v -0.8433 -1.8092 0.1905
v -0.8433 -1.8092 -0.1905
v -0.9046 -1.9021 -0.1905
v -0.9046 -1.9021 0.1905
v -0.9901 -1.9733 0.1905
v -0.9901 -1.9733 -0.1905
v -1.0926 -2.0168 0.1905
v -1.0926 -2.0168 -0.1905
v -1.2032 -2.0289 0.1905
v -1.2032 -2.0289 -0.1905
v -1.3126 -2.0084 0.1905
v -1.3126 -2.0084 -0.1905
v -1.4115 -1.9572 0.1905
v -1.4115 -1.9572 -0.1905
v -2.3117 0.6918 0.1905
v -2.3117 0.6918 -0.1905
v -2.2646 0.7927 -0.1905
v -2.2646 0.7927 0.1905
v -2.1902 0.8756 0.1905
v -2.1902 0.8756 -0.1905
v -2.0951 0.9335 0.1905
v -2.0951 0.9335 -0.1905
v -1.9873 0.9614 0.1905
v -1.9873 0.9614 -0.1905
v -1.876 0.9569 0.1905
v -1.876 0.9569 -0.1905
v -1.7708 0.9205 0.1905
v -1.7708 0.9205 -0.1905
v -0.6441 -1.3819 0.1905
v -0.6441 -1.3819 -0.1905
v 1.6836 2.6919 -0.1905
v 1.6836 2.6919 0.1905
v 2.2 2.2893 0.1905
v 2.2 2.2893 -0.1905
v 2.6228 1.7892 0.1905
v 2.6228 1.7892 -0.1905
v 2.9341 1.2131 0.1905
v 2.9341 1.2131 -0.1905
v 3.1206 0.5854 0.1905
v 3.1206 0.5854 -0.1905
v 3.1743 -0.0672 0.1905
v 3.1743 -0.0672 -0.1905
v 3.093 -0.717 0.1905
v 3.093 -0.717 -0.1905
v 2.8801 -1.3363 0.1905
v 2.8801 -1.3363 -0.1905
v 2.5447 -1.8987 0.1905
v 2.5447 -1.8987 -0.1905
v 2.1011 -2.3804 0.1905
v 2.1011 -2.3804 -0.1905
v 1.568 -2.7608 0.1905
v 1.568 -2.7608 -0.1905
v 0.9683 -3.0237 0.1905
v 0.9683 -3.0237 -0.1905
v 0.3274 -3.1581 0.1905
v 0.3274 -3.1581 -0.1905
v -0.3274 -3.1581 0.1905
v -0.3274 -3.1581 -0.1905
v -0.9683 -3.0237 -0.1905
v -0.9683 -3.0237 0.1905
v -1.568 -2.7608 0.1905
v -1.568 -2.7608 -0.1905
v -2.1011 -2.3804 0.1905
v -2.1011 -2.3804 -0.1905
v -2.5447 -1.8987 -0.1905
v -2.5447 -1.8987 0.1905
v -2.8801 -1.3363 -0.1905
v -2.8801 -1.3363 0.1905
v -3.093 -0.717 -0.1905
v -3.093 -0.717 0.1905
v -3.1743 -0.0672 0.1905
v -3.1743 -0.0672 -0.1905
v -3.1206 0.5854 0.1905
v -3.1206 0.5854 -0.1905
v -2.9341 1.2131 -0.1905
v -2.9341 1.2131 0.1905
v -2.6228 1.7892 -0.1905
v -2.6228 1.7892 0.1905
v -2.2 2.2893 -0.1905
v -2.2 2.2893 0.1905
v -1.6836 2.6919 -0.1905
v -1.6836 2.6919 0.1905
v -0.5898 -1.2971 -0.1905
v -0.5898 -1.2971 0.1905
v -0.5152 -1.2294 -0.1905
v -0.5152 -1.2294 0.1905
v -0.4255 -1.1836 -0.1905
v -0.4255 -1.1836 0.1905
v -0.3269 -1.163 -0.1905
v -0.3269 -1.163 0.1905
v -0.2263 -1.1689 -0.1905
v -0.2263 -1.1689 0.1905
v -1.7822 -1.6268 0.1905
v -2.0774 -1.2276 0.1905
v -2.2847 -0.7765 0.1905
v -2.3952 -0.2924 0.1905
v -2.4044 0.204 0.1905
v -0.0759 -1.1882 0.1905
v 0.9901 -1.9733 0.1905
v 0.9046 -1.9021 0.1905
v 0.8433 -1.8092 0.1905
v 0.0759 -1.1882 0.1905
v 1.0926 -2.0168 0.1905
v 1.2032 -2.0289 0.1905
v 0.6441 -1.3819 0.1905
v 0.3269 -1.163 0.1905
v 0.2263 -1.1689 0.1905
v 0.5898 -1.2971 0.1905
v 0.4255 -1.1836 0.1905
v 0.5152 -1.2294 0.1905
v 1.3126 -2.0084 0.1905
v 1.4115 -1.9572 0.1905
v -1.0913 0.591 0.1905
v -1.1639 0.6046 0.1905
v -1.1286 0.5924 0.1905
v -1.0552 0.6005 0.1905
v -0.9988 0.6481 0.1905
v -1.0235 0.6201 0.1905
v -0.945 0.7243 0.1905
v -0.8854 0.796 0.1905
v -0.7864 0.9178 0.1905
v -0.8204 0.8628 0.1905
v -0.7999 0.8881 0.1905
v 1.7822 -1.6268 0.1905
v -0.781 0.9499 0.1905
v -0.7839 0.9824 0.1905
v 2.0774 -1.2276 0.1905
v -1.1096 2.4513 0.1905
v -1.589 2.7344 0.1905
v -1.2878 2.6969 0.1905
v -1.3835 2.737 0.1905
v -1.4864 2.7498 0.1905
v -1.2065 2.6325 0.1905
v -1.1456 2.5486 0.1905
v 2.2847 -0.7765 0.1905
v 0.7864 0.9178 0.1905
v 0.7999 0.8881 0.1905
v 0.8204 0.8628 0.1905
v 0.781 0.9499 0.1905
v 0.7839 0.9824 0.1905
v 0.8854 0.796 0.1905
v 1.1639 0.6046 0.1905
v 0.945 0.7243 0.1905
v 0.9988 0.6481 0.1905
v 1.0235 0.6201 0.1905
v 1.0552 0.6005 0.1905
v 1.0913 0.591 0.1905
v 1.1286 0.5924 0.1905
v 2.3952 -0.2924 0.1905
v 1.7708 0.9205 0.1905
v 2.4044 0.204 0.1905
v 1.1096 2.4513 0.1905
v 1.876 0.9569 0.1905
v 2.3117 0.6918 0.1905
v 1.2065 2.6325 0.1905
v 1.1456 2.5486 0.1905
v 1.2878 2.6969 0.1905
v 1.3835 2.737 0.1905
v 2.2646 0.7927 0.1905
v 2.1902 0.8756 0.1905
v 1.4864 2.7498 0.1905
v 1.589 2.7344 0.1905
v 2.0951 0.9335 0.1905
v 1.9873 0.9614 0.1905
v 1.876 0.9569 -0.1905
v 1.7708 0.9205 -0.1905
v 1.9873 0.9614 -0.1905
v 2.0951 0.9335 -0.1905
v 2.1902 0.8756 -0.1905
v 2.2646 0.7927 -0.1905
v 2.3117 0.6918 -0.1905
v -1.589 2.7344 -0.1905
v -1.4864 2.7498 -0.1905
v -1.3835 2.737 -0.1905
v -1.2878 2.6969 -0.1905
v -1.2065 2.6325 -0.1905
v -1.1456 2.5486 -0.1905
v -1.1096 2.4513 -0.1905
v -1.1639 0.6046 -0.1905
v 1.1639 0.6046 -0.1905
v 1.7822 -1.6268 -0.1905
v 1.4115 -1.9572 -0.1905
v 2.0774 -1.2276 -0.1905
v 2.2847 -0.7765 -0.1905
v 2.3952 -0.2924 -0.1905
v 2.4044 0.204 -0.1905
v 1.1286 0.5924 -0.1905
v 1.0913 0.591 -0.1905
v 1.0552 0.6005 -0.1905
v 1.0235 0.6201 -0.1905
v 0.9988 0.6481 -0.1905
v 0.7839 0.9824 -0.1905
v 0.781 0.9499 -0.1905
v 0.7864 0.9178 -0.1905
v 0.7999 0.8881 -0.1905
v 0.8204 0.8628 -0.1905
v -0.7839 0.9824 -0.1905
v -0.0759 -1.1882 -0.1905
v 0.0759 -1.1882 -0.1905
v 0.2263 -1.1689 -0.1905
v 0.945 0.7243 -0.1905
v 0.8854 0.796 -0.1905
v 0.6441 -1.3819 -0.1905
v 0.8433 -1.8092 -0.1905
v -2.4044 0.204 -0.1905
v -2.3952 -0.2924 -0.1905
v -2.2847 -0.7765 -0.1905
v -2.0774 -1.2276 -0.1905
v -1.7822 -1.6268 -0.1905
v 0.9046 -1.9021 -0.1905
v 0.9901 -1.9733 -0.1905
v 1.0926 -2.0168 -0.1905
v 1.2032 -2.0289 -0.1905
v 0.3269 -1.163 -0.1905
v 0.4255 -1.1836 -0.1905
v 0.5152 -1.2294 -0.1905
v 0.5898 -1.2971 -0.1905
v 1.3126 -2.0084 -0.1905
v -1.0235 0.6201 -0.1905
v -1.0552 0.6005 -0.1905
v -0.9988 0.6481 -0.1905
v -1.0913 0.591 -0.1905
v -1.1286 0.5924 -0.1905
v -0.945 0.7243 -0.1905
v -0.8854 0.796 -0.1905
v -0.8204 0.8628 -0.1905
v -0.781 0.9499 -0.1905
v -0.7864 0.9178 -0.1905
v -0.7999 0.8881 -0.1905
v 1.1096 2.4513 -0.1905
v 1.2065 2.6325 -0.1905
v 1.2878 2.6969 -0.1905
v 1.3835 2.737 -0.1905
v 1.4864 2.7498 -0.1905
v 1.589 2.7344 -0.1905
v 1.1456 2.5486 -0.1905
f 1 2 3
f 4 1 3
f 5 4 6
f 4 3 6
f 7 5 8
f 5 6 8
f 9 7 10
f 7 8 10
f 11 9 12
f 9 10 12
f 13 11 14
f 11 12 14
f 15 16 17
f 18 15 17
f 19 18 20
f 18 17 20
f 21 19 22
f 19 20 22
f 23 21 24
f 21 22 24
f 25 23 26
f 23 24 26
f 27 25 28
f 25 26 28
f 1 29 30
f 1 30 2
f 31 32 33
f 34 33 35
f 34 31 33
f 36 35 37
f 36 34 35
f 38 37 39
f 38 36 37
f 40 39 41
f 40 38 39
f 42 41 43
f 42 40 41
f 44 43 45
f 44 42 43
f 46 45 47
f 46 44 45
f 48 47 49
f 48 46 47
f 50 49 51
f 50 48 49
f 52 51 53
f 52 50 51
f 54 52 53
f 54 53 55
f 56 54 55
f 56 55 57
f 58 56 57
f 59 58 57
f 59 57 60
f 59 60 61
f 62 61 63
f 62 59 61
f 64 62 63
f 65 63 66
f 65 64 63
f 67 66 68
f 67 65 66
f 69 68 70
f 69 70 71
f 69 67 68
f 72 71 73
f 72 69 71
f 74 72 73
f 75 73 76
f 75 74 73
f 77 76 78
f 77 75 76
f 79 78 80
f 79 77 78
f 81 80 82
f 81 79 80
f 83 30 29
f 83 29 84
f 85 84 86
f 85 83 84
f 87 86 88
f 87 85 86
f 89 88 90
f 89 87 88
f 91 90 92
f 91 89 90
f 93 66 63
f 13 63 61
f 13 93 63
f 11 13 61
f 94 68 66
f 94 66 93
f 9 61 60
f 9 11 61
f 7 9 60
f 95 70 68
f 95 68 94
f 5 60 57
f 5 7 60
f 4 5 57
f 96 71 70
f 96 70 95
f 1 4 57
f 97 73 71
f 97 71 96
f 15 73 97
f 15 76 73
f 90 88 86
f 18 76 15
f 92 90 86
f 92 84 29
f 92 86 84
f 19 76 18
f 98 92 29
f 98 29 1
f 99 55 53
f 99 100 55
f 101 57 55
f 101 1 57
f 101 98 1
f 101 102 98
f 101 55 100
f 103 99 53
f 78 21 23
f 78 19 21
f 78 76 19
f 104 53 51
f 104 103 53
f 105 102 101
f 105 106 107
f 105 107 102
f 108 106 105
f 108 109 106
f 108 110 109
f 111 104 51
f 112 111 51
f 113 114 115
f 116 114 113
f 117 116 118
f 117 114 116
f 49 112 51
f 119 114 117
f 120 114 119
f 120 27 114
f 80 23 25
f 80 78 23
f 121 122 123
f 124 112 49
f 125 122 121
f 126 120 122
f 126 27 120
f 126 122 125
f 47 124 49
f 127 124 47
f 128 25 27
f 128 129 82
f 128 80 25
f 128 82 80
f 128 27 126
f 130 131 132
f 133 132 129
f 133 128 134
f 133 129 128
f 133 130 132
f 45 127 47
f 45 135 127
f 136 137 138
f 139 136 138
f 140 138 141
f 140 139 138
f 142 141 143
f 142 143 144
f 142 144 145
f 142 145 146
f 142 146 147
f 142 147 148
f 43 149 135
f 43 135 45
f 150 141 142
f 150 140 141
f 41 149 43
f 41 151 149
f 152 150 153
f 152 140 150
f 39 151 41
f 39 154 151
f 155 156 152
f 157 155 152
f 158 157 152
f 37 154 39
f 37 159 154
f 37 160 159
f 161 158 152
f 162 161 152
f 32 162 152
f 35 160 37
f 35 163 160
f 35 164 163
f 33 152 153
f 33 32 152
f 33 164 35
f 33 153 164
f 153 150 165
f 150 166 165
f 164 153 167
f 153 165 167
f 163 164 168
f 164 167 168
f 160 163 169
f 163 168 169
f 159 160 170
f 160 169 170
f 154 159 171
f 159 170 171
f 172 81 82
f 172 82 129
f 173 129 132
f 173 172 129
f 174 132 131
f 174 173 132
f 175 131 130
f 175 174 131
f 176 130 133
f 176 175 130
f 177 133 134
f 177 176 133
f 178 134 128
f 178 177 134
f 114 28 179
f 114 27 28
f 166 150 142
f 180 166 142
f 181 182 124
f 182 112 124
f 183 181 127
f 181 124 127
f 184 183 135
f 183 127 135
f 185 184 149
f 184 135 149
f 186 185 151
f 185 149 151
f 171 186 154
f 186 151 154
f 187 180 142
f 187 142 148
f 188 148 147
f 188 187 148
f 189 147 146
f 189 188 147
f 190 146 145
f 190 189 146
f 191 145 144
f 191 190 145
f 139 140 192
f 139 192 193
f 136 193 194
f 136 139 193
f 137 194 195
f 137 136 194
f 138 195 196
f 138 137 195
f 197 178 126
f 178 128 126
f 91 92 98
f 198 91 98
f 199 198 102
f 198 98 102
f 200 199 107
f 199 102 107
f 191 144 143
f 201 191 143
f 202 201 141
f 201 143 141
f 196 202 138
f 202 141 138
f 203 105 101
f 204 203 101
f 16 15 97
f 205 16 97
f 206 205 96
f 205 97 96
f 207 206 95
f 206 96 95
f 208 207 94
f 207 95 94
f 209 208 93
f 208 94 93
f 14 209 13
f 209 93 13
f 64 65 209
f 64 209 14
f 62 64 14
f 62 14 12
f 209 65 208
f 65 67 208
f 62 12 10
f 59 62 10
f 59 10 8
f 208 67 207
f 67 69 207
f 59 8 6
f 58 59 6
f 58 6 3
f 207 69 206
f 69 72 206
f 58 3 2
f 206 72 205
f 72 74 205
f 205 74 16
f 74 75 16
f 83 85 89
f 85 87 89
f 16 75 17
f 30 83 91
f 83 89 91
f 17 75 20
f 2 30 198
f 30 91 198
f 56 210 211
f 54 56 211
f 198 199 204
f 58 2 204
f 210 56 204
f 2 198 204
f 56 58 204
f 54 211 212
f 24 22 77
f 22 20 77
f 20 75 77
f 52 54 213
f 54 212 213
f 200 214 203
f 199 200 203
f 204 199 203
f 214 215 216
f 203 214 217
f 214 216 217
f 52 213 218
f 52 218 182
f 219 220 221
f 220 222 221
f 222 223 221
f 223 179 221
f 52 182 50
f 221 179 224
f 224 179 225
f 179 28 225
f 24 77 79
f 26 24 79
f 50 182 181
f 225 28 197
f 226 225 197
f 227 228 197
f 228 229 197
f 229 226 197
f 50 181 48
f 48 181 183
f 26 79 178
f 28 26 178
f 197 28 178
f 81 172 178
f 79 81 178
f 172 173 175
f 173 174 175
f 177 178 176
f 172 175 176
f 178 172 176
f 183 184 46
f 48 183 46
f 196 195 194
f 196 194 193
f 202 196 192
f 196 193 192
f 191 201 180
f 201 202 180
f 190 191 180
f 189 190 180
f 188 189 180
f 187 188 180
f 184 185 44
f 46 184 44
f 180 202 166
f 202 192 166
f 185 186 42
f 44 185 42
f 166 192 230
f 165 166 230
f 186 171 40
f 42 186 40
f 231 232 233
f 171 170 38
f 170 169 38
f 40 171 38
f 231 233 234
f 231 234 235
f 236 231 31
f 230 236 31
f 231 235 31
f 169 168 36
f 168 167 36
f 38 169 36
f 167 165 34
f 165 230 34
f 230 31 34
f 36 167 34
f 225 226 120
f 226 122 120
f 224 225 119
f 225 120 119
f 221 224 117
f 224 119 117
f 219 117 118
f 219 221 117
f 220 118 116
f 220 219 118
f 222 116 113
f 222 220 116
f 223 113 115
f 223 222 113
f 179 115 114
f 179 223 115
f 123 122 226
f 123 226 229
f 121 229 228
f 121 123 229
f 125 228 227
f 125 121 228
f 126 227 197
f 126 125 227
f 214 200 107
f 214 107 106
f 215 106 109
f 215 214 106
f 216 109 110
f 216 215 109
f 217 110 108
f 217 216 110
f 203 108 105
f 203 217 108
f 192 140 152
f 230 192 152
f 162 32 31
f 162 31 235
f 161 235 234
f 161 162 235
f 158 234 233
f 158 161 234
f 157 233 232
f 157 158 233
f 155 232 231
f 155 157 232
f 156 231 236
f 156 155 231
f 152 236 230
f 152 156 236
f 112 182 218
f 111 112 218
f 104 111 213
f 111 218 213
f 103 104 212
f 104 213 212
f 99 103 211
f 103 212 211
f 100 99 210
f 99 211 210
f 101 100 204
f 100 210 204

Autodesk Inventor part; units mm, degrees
ref_plane "YZ Plane" through (0, 0, 0) normal (1, 0, 0) x (0, 1, 0)
ref_plane "XZ Plane" through (0, 0, 0) normal (0, 1, 0) x (-1, 0, 0)
ref_plane "XY Plane" through (0, 0, 0) normal (0, 0, 1) x (1, 0, 0)
sketch "Sketch1" plane through (0, 0, 0) normal (0, 0, 1) x (1, 0, 0)
  circle A0 centre (0, 0) radius 1.1906
  circle A1 centre (0, 0) radius 3.175
  dimension "d0" = 2.3813
  dimension "d1" = 6.35
extrude "Extrusion1" add sketch "Sketch1" along normal mid plane 0.381
sketch "Sketch2" plane through (0, 0, 0.1905) normal (0, 0, 1) x (1, 0, 0)
  circle A0 centre (0, 0) radius 1.1906 construction
  circle A1 centre (0, 0) radius 3.175 projected
  line L0 (0, -4.445) -> (0, 4.445) projected
  line L1 (-4.445, 0) -> (4.445, 0) projected
  circle A2 centre (0, 0) radius 1.1906 construction
  line L2 (-0.635, 0.3107) -> (0.635, 0.3107)
  line L3 (0.635, 0.3107) -> (1.27, 3.175)
  line L4 (1.27, 3.175) -> (-1.27, 3.175)
  line L5 (-1.27, 3.175) -> (-0.635, 0.3107)
  circle A3 centre (0, 0) radius 3.175 projected
  dimension "d4" = 1.27
  dimension "d5" = 2.54
  dimension "d6" = 25
extrude "Extrusion2" cut sketch "Sketch2" against normal through all contours L3 L2 L0 A1 | A1 L4 L3 | L0 L2 L5 A1 | A1 L5 L4
sketch "Sketch3" plane through (0, 0, 0.1905) normal (0, 0, 1) x (1, 0, 0)
  arc A0 (-1.2163, 2.9328) -> (1.2163, 2.9328) centre (0, 0) ccw projected
  arc A1 (-2.1409, 1.1132) -> (2.1409, 1.1132) centre (0, 0) ccw
  line L0 (-4.445, 0) -> (4.445, 0) projected
  line L1 (0, -4.3966) -> (0, 4.1543) projected
  line L2 (-2.1409, 1.1132) -> (-1.0566, 0.5487)
  arc A2 (-0.7678, 0.9099) -> (0.7678, 0.9099) centre (0, 0) ccw projected
  line L3 (2.1409, 1.1132) -> (1.0566, 0.5487)
  line L4 (-0.7678, 0.9099) -> (-1.2163, 2.9328) projected
  line L5 (-0.5029, -1.0792) -> (-1.0195, -2.187)
  line L6 (0.5029, -1.0792) -> (1.0195, -2.187)
  dimension "d9" = 0.762
  dimension "d10" = 50
  dimension "d11" = 50
  dimension "d12" = 2.1133
  dimension "d13" = 1.0058
extrude "Extrusion3" cut sketch "Sketch3" against normal through all contours L0 A2 L5 A1 | A1 L2 A2 L0 | L0 A2 L3 A1 | A1 L6 A2 L0
fillet "Fillet1" radius 0.381 8 edges at (-1.2163, 2.9328, 0) (1.2163, 2.9328, 0) (-2.1409, 1.1132, 0) (2.1409, 1.1132, 0) (-1.0195, -2.187, 0) (1.0195, -2.187, 0) (0.5029, -1.0792, 0) (-0.5029, -1.0792, 0)
fillet "Fillet2" radius 0.127 4 edges at (-0.7678, 0.9099, 0) (-1.0566, 0.5487, 0) (0.7678, 0.9099, 0) (1.0566, 0.5487, 0)
properties part number "E-Clip"
